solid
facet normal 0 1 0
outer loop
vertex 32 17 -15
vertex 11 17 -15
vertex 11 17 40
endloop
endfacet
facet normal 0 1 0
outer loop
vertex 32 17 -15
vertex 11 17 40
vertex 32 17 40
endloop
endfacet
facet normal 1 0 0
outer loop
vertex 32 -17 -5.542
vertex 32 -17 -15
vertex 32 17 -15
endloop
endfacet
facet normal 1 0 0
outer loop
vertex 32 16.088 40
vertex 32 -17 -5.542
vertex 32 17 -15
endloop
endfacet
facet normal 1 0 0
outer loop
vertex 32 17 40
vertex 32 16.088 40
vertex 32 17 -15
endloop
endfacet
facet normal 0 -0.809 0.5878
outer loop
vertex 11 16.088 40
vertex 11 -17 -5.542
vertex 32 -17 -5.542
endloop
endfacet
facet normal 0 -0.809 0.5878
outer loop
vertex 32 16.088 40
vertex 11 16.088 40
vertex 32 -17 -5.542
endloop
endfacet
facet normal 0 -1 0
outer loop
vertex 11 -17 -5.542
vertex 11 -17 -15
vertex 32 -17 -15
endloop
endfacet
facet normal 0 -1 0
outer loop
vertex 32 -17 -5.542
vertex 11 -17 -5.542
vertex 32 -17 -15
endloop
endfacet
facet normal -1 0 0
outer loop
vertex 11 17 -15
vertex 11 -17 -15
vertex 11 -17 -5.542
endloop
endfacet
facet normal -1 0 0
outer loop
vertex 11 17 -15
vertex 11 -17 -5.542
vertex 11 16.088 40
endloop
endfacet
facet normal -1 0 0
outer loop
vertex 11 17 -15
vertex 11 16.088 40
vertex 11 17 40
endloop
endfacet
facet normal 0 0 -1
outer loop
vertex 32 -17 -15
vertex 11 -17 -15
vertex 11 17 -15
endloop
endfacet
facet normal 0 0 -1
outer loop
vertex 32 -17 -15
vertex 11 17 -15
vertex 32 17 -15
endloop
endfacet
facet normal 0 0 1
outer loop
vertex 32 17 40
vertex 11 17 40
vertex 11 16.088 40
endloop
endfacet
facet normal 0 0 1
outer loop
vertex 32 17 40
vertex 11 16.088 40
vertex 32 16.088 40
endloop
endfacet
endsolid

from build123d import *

# Parameters (mm, degrees)
BOX112015002004_W          = 23
BOX112015002004_H          = 34
BOX112015002004_DEPTH      = 80
BOX112015002004_ROLL_ANGLE = -36
BOX112015002003_W          = 21
BOX112015002003_H          = 34
BOX112015002003_DEPTH      = 55


with BuildPart() as cube074:
    # Box112015002004 → Box112015002004 (new body)
    with BuildSketch(Plane.XY):
        with Locations((11.5, 17)):
            Rectangle(BOX112015002004_W, BOX112015002004_H)
    extrude(amount=BOX112015002004_DEPTH)


with BuildPart() as cube074_1:
    # Box112015002004 roll: moved
    add(cube074.part.rotate(Axis((0, 0, 0), (1, 0, 0)), BOX112015002004_ROLL_ANGLE))


with BuildPart() as cube074_2:
    # Box112015002004 placement: moved
    add(cube074_1.part.moved(Location((10, -55, 0))))


with BuildPart() as cut130:
    # Box112015002003 → Box112015002003 (new body)
    with BuildSketch(Plane(origin=(11, -17, -15), x_dir=(1, 0, 0), z_dir=(0, 0, 1))):
        with Locations((10.5, 17)):
            Rectangle(BOX112015002003_W, BOX112015002003_H)
    extrude(amount=BOX112015002003_DEPTH)

    # Cut130: cut Cube074
    add(cube074_2.part, mode=Mode.SUBTRACT)


solid = cut130.part
